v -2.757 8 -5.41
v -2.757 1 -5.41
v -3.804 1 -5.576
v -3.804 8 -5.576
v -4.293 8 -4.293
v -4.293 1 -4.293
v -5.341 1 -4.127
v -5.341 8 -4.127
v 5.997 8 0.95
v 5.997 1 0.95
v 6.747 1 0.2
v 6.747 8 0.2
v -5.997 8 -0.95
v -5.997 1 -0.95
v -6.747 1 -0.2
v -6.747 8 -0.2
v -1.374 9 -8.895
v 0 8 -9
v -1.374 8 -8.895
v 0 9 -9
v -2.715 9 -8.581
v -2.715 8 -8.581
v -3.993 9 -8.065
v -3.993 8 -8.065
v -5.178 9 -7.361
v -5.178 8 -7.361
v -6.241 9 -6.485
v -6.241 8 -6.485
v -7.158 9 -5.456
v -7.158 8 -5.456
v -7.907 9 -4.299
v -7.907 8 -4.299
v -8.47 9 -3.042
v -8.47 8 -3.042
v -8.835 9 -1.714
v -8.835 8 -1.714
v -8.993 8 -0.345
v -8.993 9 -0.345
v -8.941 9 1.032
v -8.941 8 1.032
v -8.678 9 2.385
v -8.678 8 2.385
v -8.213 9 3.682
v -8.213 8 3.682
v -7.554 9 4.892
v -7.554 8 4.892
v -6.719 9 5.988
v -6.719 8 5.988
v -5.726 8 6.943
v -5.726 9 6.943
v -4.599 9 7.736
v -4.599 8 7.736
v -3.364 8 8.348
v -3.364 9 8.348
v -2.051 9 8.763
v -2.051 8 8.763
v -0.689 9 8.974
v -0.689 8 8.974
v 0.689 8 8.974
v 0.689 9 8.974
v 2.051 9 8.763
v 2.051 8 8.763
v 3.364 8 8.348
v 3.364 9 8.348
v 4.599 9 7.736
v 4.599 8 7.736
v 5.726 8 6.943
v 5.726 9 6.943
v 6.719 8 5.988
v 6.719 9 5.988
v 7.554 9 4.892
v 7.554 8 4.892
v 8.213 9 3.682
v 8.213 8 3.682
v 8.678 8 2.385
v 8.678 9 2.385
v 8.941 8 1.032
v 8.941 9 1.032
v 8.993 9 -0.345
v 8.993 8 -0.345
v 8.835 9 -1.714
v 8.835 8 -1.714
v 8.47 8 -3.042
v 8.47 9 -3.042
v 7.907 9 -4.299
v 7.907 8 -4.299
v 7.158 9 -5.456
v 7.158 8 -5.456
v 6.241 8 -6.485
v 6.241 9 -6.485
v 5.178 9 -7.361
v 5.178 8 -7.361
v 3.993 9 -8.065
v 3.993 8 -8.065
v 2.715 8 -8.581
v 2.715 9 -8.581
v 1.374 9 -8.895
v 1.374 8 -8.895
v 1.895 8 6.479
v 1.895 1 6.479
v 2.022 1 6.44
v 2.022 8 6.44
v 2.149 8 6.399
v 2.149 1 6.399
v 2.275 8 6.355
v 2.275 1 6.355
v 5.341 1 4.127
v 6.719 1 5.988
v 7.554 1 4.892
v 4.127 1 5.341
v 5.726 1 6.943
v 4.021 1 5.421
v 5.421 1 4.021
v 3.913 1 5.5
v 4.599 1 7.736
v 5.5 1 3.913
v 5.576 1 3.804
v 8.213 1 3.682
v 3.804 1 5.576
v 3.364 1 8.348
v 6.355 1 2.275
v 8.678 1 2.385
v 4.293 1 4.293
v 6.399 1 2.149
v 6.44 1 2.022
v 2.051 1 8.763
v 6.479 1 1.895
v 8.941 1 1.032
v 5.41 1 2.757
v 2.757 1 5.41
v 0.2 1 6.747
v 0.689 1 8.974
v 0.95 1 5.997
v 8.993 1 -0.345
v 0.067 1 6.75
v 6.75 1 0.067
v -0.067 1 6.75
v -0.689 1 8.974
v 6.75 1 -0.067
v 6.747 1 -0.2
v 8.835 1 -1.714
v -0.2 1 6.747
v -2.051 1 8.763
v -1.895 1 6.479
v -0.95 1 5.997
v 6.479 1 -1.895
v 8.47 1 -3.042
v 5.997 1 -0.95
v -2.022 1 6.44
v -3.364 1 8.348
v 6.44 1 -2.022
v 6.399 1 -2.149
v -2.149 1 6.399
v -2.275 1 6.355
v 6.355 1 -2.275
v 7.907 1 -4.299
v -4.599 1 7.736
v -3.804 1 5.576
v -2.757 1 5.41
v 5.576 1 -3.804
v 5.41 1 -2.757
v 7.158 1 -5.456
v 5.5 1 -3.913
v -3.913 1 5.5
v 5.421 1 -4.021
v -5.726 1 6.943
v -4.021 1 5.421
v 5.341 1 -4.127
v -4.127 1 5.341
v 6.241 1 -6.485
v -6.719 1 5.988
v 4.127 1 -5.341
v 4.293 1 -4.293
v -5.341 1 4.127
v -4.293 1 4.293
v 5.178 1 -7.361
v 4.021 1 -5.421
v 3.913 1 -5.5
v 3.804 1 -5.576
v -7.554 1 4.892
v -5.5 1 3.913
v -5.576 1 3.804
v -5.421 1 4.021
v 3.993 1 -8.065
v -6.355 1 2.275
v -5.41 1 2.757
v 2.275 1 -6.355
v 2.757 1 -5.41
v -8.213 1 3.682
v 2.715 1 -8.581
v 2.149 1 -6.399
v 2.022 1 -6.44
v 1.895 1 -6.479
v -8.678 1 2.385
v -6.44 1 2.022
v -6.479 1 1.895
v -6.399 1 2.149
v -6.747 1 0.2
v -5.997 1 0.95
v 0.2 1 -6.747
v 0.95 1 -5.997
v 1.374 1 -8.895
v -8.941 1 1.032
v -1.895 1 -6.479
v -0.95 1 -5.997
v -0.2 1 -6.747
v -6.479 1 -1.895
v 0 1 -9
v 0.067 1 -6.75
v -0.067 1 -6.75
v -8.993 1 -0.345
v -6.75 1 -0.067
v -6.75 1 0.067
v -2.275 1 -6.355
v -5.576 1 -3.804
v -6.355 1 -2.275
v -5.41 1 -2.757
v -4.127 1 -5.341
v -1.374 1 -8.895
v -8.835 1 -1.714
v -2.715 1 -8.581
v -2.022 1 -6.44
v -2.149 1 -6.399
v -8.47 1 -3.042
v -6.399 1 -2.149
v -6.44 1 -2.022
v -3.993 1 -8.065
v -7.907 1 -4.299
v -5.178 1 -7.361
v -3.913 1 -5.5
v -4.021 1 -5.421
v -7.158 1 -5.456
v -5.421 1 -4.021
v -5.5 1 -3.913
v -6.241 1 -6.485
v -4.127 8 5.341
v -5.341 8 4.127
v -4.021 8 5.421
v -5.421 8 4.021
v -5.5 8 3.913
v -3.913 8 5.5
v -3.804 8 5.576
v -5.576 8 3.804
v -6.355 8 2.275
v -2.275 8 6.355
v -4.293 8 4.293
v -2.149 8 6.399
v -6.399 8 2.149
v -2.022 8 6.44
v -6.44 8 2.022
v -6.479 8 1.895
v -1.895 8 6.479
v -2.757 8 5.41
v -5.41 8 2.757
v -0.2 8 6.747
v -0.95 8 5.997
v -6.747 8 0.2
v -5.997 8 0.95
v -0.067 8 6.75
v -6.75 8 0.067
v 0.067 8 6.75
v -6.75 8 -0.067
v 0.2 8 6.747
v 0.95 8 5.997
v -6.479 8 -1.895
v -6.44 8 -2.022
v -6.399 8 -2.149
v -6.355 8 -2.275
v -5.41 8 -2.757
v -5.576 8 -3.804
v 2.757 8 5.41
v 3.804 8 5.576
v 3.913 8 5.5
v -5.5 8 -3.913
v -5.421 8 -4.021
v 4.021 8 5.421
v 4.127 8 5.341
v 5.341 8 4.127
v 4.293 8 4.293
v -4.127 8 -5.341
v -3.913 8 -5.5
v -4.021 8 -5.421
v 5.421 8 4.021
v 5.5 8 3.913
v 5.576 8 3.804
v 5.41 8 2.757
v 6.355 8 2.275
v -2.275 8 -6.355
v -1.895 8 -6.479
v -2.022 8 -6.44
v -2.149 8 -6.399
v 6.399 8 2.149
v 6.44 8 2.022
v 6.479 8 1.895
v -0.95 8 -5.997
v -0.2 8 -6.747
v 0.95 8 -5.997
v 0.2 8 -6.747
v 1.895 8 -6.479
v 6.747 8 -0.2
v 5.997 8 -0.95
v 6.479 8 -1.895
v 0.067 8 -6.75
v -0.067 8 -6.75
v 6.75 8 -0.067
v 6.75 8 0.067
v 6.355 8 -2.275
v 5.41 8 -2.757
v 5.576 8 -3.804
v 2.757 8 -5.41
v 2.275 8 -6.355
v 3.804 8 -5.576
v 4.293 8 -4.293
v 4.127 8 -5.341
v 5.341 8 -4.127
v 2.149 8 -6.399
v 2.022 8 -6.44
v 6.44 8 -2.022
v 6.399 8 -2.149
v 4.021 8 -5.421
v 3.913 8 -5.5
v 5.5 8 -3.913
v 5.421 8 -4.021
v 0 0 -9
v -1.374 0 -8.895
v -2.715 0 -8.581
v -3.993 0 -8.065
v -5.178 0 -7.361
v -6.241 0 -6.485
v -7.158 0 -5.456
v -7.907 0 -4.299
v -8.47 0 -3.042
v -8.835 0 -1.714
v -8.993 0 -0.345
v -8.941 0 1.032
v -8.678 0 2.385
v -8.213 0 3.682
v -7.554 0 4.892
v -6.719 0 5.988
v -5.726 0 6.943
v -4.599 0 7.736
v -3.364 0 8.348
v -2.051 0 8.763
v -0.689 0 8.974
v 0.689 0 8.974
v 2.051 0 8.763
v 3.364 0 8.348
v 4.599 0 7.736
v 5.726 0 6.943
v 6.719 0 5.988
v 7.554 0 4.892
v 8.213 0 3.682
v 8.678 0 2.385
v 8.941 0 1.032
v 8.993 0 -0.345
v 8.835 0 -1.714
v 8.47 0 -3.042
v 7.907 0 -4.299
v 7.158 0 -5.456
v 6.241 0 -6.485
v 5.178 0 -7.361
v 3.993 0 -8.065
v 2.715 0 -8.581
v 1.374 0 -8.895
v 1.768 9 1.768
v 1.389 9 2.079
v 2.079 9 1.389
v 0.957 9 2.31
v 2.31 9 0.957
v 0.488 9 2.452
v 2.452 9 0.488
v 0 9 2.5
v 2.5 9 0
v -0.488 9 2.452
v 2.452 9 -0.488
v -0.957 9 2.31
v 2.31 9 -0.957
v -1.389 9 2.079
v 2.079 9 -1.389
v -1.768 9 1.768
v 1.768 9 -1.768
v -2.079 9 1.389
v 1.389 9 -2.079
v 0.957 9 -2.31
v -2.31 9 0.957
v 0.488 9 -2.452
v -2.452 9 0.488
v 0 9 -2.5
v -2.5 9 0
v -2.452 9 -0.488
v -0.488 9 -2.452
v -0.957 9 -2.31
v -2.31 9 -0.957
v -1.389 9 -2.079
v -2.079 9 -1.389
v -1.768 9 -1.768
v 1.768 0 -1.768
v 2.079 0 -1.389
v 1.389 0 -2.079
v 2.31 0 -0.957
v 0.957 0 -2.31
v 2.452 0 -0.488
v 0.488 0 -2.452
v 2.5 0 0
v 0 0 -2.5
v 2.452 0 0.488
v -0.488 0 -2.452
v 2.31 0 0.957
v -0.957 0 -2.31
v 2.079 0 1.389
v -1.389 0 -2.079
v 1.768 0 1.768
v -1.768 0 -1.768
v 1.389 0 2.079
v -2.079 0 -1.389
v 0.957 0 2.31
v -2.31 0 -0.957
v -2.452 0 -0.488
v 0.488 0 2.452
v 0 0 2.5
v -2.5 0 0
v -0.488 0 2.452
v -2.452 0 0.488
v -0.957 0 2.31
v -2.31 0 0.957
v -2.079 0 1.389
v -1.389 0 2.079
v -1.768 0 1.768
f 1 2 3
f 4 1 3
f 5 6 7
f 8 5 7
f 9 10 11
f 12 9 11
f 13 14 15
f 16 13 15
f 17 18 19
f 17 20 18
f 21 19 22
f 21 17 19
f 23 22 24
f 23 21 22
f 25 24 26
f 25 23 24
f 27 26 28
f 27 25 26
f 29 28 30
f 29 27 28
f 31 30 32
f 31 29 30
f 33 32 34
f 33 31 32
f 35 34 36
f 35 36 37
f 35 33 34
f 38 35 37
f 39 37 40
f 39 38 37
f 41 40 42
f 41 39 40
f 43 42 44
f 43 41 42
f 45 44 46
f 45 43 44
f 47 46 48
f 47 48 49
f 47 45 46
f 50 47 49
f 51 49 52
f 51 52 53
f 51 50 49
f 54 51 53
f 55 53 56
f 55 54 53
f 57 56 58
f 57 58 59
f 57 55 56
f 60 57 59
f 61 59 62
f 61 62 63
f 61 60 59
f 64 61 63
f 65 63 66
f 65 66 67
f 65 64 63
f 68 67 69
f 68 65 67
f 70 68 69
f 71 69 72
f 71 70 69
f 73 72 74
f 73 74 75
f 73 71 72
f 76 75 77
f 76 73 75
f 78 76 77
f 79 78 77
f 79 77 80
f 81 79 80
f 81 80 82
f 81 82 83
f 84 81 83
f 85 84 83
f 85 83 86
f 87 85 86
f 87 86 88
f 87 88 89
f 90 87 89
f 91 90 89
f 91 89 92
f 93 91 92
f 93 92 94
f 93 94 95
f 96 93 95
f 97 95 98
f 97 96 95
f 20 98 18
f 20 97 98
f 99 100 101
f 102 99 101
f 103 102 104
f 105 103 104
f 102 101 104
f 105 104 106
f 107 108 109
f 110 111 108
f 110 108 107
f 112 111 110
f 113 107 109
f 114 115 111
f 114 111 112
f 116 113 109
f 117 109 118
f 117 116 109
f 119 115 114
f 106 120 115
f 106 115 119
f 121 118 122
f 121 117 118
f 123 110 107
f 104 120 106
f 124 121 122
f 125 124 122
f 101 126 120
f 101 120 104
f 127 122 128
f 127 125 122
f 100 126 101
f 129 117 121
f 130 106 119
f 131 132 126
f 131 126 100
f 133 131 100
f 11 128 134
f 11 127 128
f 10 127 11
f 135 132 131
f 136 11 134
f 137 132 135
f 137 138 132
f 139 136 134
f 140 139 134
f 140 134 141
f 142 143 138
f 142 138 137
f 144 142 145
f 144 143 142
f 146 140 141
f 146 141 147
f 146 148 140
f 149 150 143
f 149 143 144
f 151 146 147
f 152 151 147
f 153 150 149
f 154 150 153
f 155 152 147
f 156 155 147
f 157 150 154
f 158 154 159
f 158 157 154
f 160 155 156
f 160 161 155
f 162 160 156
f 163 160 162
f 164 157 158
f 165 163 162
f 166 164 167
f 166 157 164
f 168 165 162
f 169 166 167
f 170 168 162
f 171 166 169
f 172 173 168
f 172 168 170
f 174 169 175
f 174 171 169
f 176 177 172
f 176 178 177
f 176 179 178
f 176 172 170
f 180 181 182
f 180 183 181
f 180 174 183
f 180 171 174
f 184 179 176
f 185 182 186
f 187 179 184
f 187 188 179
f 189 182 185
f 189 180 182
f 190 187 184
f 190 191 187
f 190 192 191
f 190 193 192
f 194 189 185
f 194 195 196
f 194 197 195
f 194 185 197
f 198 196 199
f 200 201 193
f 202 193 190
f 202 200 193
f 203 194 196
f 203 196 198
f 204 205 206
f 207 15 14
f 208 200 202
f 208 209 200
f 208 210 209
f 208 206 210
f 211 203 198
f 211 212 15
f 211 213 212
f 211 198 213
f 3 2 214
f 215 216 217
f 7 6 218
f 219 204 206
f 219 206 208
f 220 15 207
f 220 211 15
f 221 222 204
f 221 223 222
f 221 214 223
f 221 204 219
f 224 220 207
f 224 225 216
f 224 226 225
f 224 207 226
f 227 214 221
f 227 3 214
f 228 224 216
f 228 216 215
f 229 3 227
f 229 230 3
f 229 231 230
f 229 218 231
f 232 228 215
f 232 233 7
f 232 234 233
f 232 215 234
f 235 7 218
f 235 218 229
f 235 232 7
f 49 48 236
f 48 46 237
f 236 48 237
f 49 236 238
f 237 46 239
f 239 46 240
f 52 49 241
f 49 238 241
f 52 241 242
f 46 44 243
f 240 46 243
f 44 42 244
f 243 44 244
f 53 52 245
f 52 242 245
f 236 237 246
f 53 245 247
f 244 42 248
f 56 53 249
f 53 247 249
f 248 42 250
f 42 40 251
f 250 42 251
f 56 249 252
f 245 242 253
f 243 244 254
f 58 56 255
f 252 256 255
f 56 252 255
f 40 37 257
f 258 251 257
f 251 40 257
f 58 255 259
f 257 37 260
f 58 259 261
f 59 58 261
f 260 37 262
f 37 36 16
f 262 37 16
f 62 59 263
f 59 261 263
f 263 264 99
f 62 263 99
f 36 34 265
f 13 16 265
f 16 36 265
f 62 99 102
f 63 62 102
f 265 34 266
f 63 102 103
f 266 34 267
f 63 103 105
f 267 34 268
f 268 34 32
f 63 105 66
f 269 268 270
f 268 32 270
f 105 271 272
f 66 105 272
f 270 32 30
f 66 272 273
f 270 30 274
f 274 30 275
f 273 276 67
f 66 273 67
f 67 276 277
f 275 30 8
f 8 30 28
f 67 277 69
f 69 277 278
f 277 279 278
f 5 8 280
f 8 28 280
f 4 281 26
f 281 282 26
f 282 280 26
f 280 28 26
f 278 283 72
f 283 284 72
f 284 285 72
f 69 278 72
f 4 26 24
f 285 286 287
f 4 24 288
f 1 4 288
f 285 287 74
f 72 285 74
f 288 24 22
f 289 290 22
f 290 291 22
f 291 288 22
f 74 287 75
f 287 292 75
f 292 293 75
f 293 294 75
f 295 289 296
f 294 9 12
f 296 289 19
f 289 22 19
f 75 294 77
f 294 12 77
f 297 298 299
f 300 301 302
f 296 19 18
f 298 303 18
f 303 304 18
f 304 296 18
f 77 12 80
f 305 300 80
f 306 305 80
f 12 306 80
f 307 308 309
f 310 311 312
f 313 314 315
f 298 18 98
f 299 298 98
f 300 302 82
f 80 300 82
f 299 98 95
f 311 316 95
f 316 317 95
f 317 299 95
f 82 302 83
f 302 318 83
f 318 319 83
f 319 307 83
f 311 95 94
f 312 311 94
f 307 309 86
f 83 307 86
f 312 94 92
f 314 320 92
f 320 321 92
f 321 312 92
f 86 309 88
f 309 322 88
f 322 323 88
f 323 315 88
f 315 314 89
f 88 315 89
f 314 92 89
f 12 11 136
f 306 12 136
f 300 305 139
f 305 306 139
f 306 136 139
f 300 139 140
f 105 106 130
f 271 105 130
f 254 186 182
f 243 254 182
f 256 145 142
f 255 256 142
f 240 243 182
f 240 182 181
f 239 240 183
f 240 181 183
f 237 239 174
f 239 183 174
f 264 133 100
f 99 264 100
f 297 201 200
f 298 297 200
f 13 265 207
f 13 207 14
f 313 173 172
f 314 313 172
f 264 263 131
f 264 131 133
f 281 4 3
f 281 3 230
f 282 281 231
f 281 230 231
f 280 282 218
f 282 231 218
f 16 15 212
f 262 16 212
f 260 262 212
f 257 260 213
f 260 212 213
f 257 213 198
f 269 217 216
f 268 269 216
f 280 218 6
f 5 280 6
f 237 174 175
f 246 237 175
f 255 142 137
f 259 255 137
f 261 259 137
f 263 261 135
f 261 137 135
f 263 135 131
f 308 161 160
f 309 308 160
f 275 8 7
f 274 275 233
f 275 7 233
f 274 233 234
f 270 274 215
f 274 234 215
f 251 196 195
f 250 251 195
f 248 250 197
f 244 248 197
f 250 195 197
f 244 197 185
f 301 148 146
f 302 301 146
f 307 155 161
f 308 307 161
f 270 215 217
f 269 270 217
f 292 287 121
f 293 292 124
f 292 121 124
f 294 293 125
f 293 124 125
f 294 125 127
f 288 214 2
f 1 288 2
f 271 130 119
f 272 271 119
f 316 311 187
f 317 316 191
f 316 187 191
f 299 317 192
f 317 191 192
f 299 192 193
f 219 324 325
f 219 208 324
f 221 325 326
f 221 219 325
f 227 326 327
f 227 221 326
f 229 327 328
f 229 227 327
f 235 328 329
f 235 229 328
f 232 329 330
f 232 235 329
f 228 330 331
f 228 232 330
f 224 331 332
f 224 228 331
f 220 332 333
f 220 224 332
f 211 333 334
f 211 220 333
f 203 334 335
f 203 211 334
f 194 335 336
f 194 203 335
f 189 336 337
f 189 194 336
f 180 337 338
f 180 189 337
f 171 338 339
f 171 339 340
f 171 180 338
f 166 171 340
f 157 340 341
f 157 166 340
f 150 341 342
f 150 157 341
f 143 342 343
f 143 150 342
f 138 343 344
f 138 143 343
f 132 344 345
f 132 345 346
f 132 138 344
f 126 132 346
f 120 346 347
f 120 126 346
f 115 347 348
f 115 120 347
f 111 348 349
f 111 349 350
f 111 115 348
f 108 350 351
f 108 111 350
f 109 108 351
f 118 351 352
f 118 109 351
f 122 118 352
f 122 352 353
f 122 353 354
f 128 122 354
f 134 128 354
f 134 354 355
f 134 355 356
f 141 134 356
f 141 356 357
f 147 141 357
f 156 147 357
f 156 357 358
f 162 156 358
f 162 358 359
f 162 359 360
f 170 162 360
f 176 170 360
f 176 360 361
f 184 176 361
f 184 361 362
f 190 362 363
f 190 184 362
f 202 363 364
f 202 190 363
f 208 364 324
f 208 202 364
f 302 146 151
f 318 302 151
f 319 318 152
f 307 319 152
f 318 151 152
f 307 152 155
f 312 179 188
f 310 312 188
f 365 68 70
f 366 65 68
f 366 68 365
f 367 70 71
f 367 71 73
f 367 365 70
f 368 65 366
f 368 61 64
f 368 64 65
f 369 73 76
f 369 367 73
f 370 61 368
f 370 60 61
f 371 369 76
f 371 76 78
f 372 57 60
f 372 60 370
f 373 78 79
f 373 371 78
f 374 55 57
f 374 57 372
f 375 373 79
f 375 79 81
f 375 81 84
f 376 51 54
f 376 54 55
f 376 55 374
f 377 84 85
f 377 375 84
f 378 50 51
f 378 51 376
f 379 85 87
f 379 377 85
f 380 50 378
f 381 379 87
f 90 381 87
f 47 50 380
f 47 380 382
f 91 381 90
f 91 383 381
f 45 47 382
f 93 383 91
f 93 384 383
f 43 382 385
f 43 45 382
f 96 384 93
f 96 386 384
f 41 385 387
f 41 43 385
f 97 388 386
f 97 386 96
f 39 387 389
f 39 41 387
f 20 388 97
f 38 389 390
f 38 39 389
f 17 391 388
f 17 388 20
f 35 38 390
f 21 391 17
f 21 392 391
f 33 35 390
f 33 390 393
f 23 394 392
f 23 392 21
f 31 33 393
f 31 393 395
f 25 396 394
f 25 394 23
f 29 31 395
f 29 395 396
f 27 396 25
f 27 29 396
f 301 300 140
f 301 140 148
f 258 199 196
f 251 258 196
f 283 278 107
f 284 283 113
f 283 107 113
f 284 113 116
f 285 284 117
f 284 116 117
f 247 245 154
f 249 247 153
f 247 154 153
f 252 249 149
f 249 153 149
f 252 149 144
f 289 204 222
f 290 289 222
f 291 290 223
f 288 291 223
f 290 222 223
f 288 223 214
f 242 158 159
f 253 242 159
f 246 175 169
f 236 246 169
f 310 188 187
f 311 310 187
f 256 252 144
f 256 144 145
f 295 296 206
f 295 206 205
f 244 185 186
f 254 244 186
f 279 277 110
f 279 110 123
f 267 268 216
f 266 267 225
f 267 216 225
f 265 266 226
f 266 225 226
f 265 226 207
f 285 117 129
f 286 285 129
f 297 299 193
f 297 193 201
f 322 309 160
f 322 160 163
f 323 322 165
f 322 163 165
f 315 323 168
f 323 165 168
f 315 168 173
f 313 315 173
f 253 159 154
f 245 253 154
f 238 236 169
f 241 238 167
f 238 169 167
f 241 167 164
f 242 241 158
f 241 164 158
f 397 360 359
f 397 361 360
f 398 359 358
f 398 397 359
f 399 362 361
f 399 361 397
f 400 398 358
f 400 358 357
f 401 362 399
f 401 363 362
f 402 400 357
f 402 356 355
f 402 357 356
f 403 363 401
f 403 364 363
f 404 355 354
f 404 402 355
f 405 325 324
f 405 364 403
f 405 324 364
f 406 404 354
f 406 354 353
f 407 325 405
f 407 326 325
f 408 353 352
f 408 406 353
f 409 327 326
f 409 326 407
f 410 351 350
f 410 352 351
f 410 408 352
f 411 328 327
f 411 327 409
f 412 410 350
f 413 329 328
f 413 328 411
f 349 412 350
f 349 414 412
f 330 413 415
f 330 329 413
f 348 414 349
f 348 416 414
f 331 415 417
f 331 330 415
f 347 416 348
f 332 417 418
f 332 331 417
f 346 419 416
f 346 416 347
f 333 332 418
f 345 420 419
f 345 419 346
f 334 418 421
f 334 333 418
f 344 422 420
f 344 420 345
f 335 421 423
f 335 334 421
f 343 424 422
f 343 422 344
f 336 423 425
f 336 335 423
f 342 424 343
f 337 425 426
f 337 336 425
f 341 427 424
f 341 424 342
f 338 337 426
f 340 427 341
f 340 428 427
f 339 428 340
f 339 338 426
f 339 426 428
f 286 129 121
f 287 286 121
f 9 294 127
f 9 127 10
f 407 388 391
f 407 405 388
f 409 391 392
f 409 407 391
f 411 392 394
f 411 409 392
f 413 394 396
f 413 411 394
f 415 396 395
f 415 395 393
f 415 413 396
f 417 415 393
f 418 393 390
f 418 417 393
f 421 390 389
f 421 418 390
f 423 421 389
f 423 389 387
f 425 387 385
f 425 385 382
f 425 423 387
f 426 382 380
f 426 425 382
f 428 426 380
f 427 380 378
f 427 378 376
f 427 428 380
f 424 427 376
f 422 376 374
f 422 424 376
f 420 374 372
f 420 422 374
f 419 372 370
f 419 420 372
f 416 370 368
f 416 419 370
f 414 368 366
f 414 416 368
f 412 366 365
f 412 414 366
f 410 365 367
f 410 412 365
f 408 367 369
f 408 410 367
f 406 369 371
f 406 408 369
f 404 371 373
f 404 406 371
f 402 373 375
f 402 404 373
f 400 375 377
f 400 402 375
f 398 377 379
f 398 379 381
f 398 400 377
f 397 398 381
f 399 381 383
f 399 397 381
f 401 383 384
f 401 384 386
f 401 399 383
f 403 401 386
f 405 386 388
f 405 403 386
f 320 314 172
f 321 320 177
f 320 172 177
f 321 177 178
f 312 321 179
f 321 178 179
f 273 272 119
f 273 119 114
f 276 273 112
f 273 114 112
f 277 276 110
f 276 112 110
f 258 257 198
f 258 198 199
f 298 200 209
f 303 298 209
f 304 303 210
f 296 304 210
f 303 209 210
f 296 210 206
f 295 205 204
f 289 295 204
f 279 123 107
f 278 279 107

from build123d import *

# Parameters (mm, degrees)
BOSS_EXTRUDE1_REACH = 17.033
CIRPATTERN1_COUNT   = 20
SKETCH3_R           = 7.5
SKETCH3_R_2         = 6.75
CUT_EXTRUDE1_DEPTH  = 7


with BuildPart() as part:
    # Sketch1 → Revolve1 (revolve)
    with BuildSketch(Plane.XY, mode=Mode.PRIVATE) as revolve1_sk:
        Polygon((-2.5, 0), (-9, 0), (-9, 1), (-6.05, 1), (-6.05, 8), (-9, 8), (-9, 9), (-2.5, 9), align=None)
    revolve(revolve1_sk.sketch.rotate(Axis((0, 0, 0), (0, 1, 0)), 270), axis=Axis((0, 0, 0), (0, 1, 0)))

    # Sketch2 → Boss-Extrude1 (add, up to next)
    with BuildSketch(Plane(origin=(0, 1, 0), x_dir=(1, 0, 0), z_dir=(0, 1, 0)), mode=Mode.PRIVATE) as boss_extrude1_sk1:
        Polygon((-6.946844773, 0), (-5.946844773, -1), (-5.946844773, 1), align=None)
    boss_extrude1_tool1 = extrude(boss_extrude1_sk1.sketch, amount=BOSS_EXTRUDE1_REACH, mode=Mode.PRIVATE) - part.part
    boss_extrude1 = boss_extrude1_tool1.solids().sort_by_distance((-6.280178, 1, 0))[0]
    add(boss_extrude1)

    # CirPattern1: Boss-Extrude1 ×20 about axis
    cirpattern1_axis = Axis((0, 0, 0), (0, 1, 0))
    for i in range(1, CIRPATTERN1_COUNT):
        add(boss_extrude1.rotate(cirpattern1_axis, i * 360 / CIRPATTERN1_COUNT))

    # Sketch3 → Cut-Extrude1 (cut)
    with BuildSketch(Plane(origin=(0, 1, 0), x_dir=(1, 0, 0), z_dir=(0, 1, 0))):
        Circle(SKETCH3_R)
        Circle(SKETCH3_R_2, mode=Mode.SUBTRACT)
    extrude(amount=CUT_EXTRUDE1_DEPTH, mode=Mode.SUBTRACT)


solid = part.part
